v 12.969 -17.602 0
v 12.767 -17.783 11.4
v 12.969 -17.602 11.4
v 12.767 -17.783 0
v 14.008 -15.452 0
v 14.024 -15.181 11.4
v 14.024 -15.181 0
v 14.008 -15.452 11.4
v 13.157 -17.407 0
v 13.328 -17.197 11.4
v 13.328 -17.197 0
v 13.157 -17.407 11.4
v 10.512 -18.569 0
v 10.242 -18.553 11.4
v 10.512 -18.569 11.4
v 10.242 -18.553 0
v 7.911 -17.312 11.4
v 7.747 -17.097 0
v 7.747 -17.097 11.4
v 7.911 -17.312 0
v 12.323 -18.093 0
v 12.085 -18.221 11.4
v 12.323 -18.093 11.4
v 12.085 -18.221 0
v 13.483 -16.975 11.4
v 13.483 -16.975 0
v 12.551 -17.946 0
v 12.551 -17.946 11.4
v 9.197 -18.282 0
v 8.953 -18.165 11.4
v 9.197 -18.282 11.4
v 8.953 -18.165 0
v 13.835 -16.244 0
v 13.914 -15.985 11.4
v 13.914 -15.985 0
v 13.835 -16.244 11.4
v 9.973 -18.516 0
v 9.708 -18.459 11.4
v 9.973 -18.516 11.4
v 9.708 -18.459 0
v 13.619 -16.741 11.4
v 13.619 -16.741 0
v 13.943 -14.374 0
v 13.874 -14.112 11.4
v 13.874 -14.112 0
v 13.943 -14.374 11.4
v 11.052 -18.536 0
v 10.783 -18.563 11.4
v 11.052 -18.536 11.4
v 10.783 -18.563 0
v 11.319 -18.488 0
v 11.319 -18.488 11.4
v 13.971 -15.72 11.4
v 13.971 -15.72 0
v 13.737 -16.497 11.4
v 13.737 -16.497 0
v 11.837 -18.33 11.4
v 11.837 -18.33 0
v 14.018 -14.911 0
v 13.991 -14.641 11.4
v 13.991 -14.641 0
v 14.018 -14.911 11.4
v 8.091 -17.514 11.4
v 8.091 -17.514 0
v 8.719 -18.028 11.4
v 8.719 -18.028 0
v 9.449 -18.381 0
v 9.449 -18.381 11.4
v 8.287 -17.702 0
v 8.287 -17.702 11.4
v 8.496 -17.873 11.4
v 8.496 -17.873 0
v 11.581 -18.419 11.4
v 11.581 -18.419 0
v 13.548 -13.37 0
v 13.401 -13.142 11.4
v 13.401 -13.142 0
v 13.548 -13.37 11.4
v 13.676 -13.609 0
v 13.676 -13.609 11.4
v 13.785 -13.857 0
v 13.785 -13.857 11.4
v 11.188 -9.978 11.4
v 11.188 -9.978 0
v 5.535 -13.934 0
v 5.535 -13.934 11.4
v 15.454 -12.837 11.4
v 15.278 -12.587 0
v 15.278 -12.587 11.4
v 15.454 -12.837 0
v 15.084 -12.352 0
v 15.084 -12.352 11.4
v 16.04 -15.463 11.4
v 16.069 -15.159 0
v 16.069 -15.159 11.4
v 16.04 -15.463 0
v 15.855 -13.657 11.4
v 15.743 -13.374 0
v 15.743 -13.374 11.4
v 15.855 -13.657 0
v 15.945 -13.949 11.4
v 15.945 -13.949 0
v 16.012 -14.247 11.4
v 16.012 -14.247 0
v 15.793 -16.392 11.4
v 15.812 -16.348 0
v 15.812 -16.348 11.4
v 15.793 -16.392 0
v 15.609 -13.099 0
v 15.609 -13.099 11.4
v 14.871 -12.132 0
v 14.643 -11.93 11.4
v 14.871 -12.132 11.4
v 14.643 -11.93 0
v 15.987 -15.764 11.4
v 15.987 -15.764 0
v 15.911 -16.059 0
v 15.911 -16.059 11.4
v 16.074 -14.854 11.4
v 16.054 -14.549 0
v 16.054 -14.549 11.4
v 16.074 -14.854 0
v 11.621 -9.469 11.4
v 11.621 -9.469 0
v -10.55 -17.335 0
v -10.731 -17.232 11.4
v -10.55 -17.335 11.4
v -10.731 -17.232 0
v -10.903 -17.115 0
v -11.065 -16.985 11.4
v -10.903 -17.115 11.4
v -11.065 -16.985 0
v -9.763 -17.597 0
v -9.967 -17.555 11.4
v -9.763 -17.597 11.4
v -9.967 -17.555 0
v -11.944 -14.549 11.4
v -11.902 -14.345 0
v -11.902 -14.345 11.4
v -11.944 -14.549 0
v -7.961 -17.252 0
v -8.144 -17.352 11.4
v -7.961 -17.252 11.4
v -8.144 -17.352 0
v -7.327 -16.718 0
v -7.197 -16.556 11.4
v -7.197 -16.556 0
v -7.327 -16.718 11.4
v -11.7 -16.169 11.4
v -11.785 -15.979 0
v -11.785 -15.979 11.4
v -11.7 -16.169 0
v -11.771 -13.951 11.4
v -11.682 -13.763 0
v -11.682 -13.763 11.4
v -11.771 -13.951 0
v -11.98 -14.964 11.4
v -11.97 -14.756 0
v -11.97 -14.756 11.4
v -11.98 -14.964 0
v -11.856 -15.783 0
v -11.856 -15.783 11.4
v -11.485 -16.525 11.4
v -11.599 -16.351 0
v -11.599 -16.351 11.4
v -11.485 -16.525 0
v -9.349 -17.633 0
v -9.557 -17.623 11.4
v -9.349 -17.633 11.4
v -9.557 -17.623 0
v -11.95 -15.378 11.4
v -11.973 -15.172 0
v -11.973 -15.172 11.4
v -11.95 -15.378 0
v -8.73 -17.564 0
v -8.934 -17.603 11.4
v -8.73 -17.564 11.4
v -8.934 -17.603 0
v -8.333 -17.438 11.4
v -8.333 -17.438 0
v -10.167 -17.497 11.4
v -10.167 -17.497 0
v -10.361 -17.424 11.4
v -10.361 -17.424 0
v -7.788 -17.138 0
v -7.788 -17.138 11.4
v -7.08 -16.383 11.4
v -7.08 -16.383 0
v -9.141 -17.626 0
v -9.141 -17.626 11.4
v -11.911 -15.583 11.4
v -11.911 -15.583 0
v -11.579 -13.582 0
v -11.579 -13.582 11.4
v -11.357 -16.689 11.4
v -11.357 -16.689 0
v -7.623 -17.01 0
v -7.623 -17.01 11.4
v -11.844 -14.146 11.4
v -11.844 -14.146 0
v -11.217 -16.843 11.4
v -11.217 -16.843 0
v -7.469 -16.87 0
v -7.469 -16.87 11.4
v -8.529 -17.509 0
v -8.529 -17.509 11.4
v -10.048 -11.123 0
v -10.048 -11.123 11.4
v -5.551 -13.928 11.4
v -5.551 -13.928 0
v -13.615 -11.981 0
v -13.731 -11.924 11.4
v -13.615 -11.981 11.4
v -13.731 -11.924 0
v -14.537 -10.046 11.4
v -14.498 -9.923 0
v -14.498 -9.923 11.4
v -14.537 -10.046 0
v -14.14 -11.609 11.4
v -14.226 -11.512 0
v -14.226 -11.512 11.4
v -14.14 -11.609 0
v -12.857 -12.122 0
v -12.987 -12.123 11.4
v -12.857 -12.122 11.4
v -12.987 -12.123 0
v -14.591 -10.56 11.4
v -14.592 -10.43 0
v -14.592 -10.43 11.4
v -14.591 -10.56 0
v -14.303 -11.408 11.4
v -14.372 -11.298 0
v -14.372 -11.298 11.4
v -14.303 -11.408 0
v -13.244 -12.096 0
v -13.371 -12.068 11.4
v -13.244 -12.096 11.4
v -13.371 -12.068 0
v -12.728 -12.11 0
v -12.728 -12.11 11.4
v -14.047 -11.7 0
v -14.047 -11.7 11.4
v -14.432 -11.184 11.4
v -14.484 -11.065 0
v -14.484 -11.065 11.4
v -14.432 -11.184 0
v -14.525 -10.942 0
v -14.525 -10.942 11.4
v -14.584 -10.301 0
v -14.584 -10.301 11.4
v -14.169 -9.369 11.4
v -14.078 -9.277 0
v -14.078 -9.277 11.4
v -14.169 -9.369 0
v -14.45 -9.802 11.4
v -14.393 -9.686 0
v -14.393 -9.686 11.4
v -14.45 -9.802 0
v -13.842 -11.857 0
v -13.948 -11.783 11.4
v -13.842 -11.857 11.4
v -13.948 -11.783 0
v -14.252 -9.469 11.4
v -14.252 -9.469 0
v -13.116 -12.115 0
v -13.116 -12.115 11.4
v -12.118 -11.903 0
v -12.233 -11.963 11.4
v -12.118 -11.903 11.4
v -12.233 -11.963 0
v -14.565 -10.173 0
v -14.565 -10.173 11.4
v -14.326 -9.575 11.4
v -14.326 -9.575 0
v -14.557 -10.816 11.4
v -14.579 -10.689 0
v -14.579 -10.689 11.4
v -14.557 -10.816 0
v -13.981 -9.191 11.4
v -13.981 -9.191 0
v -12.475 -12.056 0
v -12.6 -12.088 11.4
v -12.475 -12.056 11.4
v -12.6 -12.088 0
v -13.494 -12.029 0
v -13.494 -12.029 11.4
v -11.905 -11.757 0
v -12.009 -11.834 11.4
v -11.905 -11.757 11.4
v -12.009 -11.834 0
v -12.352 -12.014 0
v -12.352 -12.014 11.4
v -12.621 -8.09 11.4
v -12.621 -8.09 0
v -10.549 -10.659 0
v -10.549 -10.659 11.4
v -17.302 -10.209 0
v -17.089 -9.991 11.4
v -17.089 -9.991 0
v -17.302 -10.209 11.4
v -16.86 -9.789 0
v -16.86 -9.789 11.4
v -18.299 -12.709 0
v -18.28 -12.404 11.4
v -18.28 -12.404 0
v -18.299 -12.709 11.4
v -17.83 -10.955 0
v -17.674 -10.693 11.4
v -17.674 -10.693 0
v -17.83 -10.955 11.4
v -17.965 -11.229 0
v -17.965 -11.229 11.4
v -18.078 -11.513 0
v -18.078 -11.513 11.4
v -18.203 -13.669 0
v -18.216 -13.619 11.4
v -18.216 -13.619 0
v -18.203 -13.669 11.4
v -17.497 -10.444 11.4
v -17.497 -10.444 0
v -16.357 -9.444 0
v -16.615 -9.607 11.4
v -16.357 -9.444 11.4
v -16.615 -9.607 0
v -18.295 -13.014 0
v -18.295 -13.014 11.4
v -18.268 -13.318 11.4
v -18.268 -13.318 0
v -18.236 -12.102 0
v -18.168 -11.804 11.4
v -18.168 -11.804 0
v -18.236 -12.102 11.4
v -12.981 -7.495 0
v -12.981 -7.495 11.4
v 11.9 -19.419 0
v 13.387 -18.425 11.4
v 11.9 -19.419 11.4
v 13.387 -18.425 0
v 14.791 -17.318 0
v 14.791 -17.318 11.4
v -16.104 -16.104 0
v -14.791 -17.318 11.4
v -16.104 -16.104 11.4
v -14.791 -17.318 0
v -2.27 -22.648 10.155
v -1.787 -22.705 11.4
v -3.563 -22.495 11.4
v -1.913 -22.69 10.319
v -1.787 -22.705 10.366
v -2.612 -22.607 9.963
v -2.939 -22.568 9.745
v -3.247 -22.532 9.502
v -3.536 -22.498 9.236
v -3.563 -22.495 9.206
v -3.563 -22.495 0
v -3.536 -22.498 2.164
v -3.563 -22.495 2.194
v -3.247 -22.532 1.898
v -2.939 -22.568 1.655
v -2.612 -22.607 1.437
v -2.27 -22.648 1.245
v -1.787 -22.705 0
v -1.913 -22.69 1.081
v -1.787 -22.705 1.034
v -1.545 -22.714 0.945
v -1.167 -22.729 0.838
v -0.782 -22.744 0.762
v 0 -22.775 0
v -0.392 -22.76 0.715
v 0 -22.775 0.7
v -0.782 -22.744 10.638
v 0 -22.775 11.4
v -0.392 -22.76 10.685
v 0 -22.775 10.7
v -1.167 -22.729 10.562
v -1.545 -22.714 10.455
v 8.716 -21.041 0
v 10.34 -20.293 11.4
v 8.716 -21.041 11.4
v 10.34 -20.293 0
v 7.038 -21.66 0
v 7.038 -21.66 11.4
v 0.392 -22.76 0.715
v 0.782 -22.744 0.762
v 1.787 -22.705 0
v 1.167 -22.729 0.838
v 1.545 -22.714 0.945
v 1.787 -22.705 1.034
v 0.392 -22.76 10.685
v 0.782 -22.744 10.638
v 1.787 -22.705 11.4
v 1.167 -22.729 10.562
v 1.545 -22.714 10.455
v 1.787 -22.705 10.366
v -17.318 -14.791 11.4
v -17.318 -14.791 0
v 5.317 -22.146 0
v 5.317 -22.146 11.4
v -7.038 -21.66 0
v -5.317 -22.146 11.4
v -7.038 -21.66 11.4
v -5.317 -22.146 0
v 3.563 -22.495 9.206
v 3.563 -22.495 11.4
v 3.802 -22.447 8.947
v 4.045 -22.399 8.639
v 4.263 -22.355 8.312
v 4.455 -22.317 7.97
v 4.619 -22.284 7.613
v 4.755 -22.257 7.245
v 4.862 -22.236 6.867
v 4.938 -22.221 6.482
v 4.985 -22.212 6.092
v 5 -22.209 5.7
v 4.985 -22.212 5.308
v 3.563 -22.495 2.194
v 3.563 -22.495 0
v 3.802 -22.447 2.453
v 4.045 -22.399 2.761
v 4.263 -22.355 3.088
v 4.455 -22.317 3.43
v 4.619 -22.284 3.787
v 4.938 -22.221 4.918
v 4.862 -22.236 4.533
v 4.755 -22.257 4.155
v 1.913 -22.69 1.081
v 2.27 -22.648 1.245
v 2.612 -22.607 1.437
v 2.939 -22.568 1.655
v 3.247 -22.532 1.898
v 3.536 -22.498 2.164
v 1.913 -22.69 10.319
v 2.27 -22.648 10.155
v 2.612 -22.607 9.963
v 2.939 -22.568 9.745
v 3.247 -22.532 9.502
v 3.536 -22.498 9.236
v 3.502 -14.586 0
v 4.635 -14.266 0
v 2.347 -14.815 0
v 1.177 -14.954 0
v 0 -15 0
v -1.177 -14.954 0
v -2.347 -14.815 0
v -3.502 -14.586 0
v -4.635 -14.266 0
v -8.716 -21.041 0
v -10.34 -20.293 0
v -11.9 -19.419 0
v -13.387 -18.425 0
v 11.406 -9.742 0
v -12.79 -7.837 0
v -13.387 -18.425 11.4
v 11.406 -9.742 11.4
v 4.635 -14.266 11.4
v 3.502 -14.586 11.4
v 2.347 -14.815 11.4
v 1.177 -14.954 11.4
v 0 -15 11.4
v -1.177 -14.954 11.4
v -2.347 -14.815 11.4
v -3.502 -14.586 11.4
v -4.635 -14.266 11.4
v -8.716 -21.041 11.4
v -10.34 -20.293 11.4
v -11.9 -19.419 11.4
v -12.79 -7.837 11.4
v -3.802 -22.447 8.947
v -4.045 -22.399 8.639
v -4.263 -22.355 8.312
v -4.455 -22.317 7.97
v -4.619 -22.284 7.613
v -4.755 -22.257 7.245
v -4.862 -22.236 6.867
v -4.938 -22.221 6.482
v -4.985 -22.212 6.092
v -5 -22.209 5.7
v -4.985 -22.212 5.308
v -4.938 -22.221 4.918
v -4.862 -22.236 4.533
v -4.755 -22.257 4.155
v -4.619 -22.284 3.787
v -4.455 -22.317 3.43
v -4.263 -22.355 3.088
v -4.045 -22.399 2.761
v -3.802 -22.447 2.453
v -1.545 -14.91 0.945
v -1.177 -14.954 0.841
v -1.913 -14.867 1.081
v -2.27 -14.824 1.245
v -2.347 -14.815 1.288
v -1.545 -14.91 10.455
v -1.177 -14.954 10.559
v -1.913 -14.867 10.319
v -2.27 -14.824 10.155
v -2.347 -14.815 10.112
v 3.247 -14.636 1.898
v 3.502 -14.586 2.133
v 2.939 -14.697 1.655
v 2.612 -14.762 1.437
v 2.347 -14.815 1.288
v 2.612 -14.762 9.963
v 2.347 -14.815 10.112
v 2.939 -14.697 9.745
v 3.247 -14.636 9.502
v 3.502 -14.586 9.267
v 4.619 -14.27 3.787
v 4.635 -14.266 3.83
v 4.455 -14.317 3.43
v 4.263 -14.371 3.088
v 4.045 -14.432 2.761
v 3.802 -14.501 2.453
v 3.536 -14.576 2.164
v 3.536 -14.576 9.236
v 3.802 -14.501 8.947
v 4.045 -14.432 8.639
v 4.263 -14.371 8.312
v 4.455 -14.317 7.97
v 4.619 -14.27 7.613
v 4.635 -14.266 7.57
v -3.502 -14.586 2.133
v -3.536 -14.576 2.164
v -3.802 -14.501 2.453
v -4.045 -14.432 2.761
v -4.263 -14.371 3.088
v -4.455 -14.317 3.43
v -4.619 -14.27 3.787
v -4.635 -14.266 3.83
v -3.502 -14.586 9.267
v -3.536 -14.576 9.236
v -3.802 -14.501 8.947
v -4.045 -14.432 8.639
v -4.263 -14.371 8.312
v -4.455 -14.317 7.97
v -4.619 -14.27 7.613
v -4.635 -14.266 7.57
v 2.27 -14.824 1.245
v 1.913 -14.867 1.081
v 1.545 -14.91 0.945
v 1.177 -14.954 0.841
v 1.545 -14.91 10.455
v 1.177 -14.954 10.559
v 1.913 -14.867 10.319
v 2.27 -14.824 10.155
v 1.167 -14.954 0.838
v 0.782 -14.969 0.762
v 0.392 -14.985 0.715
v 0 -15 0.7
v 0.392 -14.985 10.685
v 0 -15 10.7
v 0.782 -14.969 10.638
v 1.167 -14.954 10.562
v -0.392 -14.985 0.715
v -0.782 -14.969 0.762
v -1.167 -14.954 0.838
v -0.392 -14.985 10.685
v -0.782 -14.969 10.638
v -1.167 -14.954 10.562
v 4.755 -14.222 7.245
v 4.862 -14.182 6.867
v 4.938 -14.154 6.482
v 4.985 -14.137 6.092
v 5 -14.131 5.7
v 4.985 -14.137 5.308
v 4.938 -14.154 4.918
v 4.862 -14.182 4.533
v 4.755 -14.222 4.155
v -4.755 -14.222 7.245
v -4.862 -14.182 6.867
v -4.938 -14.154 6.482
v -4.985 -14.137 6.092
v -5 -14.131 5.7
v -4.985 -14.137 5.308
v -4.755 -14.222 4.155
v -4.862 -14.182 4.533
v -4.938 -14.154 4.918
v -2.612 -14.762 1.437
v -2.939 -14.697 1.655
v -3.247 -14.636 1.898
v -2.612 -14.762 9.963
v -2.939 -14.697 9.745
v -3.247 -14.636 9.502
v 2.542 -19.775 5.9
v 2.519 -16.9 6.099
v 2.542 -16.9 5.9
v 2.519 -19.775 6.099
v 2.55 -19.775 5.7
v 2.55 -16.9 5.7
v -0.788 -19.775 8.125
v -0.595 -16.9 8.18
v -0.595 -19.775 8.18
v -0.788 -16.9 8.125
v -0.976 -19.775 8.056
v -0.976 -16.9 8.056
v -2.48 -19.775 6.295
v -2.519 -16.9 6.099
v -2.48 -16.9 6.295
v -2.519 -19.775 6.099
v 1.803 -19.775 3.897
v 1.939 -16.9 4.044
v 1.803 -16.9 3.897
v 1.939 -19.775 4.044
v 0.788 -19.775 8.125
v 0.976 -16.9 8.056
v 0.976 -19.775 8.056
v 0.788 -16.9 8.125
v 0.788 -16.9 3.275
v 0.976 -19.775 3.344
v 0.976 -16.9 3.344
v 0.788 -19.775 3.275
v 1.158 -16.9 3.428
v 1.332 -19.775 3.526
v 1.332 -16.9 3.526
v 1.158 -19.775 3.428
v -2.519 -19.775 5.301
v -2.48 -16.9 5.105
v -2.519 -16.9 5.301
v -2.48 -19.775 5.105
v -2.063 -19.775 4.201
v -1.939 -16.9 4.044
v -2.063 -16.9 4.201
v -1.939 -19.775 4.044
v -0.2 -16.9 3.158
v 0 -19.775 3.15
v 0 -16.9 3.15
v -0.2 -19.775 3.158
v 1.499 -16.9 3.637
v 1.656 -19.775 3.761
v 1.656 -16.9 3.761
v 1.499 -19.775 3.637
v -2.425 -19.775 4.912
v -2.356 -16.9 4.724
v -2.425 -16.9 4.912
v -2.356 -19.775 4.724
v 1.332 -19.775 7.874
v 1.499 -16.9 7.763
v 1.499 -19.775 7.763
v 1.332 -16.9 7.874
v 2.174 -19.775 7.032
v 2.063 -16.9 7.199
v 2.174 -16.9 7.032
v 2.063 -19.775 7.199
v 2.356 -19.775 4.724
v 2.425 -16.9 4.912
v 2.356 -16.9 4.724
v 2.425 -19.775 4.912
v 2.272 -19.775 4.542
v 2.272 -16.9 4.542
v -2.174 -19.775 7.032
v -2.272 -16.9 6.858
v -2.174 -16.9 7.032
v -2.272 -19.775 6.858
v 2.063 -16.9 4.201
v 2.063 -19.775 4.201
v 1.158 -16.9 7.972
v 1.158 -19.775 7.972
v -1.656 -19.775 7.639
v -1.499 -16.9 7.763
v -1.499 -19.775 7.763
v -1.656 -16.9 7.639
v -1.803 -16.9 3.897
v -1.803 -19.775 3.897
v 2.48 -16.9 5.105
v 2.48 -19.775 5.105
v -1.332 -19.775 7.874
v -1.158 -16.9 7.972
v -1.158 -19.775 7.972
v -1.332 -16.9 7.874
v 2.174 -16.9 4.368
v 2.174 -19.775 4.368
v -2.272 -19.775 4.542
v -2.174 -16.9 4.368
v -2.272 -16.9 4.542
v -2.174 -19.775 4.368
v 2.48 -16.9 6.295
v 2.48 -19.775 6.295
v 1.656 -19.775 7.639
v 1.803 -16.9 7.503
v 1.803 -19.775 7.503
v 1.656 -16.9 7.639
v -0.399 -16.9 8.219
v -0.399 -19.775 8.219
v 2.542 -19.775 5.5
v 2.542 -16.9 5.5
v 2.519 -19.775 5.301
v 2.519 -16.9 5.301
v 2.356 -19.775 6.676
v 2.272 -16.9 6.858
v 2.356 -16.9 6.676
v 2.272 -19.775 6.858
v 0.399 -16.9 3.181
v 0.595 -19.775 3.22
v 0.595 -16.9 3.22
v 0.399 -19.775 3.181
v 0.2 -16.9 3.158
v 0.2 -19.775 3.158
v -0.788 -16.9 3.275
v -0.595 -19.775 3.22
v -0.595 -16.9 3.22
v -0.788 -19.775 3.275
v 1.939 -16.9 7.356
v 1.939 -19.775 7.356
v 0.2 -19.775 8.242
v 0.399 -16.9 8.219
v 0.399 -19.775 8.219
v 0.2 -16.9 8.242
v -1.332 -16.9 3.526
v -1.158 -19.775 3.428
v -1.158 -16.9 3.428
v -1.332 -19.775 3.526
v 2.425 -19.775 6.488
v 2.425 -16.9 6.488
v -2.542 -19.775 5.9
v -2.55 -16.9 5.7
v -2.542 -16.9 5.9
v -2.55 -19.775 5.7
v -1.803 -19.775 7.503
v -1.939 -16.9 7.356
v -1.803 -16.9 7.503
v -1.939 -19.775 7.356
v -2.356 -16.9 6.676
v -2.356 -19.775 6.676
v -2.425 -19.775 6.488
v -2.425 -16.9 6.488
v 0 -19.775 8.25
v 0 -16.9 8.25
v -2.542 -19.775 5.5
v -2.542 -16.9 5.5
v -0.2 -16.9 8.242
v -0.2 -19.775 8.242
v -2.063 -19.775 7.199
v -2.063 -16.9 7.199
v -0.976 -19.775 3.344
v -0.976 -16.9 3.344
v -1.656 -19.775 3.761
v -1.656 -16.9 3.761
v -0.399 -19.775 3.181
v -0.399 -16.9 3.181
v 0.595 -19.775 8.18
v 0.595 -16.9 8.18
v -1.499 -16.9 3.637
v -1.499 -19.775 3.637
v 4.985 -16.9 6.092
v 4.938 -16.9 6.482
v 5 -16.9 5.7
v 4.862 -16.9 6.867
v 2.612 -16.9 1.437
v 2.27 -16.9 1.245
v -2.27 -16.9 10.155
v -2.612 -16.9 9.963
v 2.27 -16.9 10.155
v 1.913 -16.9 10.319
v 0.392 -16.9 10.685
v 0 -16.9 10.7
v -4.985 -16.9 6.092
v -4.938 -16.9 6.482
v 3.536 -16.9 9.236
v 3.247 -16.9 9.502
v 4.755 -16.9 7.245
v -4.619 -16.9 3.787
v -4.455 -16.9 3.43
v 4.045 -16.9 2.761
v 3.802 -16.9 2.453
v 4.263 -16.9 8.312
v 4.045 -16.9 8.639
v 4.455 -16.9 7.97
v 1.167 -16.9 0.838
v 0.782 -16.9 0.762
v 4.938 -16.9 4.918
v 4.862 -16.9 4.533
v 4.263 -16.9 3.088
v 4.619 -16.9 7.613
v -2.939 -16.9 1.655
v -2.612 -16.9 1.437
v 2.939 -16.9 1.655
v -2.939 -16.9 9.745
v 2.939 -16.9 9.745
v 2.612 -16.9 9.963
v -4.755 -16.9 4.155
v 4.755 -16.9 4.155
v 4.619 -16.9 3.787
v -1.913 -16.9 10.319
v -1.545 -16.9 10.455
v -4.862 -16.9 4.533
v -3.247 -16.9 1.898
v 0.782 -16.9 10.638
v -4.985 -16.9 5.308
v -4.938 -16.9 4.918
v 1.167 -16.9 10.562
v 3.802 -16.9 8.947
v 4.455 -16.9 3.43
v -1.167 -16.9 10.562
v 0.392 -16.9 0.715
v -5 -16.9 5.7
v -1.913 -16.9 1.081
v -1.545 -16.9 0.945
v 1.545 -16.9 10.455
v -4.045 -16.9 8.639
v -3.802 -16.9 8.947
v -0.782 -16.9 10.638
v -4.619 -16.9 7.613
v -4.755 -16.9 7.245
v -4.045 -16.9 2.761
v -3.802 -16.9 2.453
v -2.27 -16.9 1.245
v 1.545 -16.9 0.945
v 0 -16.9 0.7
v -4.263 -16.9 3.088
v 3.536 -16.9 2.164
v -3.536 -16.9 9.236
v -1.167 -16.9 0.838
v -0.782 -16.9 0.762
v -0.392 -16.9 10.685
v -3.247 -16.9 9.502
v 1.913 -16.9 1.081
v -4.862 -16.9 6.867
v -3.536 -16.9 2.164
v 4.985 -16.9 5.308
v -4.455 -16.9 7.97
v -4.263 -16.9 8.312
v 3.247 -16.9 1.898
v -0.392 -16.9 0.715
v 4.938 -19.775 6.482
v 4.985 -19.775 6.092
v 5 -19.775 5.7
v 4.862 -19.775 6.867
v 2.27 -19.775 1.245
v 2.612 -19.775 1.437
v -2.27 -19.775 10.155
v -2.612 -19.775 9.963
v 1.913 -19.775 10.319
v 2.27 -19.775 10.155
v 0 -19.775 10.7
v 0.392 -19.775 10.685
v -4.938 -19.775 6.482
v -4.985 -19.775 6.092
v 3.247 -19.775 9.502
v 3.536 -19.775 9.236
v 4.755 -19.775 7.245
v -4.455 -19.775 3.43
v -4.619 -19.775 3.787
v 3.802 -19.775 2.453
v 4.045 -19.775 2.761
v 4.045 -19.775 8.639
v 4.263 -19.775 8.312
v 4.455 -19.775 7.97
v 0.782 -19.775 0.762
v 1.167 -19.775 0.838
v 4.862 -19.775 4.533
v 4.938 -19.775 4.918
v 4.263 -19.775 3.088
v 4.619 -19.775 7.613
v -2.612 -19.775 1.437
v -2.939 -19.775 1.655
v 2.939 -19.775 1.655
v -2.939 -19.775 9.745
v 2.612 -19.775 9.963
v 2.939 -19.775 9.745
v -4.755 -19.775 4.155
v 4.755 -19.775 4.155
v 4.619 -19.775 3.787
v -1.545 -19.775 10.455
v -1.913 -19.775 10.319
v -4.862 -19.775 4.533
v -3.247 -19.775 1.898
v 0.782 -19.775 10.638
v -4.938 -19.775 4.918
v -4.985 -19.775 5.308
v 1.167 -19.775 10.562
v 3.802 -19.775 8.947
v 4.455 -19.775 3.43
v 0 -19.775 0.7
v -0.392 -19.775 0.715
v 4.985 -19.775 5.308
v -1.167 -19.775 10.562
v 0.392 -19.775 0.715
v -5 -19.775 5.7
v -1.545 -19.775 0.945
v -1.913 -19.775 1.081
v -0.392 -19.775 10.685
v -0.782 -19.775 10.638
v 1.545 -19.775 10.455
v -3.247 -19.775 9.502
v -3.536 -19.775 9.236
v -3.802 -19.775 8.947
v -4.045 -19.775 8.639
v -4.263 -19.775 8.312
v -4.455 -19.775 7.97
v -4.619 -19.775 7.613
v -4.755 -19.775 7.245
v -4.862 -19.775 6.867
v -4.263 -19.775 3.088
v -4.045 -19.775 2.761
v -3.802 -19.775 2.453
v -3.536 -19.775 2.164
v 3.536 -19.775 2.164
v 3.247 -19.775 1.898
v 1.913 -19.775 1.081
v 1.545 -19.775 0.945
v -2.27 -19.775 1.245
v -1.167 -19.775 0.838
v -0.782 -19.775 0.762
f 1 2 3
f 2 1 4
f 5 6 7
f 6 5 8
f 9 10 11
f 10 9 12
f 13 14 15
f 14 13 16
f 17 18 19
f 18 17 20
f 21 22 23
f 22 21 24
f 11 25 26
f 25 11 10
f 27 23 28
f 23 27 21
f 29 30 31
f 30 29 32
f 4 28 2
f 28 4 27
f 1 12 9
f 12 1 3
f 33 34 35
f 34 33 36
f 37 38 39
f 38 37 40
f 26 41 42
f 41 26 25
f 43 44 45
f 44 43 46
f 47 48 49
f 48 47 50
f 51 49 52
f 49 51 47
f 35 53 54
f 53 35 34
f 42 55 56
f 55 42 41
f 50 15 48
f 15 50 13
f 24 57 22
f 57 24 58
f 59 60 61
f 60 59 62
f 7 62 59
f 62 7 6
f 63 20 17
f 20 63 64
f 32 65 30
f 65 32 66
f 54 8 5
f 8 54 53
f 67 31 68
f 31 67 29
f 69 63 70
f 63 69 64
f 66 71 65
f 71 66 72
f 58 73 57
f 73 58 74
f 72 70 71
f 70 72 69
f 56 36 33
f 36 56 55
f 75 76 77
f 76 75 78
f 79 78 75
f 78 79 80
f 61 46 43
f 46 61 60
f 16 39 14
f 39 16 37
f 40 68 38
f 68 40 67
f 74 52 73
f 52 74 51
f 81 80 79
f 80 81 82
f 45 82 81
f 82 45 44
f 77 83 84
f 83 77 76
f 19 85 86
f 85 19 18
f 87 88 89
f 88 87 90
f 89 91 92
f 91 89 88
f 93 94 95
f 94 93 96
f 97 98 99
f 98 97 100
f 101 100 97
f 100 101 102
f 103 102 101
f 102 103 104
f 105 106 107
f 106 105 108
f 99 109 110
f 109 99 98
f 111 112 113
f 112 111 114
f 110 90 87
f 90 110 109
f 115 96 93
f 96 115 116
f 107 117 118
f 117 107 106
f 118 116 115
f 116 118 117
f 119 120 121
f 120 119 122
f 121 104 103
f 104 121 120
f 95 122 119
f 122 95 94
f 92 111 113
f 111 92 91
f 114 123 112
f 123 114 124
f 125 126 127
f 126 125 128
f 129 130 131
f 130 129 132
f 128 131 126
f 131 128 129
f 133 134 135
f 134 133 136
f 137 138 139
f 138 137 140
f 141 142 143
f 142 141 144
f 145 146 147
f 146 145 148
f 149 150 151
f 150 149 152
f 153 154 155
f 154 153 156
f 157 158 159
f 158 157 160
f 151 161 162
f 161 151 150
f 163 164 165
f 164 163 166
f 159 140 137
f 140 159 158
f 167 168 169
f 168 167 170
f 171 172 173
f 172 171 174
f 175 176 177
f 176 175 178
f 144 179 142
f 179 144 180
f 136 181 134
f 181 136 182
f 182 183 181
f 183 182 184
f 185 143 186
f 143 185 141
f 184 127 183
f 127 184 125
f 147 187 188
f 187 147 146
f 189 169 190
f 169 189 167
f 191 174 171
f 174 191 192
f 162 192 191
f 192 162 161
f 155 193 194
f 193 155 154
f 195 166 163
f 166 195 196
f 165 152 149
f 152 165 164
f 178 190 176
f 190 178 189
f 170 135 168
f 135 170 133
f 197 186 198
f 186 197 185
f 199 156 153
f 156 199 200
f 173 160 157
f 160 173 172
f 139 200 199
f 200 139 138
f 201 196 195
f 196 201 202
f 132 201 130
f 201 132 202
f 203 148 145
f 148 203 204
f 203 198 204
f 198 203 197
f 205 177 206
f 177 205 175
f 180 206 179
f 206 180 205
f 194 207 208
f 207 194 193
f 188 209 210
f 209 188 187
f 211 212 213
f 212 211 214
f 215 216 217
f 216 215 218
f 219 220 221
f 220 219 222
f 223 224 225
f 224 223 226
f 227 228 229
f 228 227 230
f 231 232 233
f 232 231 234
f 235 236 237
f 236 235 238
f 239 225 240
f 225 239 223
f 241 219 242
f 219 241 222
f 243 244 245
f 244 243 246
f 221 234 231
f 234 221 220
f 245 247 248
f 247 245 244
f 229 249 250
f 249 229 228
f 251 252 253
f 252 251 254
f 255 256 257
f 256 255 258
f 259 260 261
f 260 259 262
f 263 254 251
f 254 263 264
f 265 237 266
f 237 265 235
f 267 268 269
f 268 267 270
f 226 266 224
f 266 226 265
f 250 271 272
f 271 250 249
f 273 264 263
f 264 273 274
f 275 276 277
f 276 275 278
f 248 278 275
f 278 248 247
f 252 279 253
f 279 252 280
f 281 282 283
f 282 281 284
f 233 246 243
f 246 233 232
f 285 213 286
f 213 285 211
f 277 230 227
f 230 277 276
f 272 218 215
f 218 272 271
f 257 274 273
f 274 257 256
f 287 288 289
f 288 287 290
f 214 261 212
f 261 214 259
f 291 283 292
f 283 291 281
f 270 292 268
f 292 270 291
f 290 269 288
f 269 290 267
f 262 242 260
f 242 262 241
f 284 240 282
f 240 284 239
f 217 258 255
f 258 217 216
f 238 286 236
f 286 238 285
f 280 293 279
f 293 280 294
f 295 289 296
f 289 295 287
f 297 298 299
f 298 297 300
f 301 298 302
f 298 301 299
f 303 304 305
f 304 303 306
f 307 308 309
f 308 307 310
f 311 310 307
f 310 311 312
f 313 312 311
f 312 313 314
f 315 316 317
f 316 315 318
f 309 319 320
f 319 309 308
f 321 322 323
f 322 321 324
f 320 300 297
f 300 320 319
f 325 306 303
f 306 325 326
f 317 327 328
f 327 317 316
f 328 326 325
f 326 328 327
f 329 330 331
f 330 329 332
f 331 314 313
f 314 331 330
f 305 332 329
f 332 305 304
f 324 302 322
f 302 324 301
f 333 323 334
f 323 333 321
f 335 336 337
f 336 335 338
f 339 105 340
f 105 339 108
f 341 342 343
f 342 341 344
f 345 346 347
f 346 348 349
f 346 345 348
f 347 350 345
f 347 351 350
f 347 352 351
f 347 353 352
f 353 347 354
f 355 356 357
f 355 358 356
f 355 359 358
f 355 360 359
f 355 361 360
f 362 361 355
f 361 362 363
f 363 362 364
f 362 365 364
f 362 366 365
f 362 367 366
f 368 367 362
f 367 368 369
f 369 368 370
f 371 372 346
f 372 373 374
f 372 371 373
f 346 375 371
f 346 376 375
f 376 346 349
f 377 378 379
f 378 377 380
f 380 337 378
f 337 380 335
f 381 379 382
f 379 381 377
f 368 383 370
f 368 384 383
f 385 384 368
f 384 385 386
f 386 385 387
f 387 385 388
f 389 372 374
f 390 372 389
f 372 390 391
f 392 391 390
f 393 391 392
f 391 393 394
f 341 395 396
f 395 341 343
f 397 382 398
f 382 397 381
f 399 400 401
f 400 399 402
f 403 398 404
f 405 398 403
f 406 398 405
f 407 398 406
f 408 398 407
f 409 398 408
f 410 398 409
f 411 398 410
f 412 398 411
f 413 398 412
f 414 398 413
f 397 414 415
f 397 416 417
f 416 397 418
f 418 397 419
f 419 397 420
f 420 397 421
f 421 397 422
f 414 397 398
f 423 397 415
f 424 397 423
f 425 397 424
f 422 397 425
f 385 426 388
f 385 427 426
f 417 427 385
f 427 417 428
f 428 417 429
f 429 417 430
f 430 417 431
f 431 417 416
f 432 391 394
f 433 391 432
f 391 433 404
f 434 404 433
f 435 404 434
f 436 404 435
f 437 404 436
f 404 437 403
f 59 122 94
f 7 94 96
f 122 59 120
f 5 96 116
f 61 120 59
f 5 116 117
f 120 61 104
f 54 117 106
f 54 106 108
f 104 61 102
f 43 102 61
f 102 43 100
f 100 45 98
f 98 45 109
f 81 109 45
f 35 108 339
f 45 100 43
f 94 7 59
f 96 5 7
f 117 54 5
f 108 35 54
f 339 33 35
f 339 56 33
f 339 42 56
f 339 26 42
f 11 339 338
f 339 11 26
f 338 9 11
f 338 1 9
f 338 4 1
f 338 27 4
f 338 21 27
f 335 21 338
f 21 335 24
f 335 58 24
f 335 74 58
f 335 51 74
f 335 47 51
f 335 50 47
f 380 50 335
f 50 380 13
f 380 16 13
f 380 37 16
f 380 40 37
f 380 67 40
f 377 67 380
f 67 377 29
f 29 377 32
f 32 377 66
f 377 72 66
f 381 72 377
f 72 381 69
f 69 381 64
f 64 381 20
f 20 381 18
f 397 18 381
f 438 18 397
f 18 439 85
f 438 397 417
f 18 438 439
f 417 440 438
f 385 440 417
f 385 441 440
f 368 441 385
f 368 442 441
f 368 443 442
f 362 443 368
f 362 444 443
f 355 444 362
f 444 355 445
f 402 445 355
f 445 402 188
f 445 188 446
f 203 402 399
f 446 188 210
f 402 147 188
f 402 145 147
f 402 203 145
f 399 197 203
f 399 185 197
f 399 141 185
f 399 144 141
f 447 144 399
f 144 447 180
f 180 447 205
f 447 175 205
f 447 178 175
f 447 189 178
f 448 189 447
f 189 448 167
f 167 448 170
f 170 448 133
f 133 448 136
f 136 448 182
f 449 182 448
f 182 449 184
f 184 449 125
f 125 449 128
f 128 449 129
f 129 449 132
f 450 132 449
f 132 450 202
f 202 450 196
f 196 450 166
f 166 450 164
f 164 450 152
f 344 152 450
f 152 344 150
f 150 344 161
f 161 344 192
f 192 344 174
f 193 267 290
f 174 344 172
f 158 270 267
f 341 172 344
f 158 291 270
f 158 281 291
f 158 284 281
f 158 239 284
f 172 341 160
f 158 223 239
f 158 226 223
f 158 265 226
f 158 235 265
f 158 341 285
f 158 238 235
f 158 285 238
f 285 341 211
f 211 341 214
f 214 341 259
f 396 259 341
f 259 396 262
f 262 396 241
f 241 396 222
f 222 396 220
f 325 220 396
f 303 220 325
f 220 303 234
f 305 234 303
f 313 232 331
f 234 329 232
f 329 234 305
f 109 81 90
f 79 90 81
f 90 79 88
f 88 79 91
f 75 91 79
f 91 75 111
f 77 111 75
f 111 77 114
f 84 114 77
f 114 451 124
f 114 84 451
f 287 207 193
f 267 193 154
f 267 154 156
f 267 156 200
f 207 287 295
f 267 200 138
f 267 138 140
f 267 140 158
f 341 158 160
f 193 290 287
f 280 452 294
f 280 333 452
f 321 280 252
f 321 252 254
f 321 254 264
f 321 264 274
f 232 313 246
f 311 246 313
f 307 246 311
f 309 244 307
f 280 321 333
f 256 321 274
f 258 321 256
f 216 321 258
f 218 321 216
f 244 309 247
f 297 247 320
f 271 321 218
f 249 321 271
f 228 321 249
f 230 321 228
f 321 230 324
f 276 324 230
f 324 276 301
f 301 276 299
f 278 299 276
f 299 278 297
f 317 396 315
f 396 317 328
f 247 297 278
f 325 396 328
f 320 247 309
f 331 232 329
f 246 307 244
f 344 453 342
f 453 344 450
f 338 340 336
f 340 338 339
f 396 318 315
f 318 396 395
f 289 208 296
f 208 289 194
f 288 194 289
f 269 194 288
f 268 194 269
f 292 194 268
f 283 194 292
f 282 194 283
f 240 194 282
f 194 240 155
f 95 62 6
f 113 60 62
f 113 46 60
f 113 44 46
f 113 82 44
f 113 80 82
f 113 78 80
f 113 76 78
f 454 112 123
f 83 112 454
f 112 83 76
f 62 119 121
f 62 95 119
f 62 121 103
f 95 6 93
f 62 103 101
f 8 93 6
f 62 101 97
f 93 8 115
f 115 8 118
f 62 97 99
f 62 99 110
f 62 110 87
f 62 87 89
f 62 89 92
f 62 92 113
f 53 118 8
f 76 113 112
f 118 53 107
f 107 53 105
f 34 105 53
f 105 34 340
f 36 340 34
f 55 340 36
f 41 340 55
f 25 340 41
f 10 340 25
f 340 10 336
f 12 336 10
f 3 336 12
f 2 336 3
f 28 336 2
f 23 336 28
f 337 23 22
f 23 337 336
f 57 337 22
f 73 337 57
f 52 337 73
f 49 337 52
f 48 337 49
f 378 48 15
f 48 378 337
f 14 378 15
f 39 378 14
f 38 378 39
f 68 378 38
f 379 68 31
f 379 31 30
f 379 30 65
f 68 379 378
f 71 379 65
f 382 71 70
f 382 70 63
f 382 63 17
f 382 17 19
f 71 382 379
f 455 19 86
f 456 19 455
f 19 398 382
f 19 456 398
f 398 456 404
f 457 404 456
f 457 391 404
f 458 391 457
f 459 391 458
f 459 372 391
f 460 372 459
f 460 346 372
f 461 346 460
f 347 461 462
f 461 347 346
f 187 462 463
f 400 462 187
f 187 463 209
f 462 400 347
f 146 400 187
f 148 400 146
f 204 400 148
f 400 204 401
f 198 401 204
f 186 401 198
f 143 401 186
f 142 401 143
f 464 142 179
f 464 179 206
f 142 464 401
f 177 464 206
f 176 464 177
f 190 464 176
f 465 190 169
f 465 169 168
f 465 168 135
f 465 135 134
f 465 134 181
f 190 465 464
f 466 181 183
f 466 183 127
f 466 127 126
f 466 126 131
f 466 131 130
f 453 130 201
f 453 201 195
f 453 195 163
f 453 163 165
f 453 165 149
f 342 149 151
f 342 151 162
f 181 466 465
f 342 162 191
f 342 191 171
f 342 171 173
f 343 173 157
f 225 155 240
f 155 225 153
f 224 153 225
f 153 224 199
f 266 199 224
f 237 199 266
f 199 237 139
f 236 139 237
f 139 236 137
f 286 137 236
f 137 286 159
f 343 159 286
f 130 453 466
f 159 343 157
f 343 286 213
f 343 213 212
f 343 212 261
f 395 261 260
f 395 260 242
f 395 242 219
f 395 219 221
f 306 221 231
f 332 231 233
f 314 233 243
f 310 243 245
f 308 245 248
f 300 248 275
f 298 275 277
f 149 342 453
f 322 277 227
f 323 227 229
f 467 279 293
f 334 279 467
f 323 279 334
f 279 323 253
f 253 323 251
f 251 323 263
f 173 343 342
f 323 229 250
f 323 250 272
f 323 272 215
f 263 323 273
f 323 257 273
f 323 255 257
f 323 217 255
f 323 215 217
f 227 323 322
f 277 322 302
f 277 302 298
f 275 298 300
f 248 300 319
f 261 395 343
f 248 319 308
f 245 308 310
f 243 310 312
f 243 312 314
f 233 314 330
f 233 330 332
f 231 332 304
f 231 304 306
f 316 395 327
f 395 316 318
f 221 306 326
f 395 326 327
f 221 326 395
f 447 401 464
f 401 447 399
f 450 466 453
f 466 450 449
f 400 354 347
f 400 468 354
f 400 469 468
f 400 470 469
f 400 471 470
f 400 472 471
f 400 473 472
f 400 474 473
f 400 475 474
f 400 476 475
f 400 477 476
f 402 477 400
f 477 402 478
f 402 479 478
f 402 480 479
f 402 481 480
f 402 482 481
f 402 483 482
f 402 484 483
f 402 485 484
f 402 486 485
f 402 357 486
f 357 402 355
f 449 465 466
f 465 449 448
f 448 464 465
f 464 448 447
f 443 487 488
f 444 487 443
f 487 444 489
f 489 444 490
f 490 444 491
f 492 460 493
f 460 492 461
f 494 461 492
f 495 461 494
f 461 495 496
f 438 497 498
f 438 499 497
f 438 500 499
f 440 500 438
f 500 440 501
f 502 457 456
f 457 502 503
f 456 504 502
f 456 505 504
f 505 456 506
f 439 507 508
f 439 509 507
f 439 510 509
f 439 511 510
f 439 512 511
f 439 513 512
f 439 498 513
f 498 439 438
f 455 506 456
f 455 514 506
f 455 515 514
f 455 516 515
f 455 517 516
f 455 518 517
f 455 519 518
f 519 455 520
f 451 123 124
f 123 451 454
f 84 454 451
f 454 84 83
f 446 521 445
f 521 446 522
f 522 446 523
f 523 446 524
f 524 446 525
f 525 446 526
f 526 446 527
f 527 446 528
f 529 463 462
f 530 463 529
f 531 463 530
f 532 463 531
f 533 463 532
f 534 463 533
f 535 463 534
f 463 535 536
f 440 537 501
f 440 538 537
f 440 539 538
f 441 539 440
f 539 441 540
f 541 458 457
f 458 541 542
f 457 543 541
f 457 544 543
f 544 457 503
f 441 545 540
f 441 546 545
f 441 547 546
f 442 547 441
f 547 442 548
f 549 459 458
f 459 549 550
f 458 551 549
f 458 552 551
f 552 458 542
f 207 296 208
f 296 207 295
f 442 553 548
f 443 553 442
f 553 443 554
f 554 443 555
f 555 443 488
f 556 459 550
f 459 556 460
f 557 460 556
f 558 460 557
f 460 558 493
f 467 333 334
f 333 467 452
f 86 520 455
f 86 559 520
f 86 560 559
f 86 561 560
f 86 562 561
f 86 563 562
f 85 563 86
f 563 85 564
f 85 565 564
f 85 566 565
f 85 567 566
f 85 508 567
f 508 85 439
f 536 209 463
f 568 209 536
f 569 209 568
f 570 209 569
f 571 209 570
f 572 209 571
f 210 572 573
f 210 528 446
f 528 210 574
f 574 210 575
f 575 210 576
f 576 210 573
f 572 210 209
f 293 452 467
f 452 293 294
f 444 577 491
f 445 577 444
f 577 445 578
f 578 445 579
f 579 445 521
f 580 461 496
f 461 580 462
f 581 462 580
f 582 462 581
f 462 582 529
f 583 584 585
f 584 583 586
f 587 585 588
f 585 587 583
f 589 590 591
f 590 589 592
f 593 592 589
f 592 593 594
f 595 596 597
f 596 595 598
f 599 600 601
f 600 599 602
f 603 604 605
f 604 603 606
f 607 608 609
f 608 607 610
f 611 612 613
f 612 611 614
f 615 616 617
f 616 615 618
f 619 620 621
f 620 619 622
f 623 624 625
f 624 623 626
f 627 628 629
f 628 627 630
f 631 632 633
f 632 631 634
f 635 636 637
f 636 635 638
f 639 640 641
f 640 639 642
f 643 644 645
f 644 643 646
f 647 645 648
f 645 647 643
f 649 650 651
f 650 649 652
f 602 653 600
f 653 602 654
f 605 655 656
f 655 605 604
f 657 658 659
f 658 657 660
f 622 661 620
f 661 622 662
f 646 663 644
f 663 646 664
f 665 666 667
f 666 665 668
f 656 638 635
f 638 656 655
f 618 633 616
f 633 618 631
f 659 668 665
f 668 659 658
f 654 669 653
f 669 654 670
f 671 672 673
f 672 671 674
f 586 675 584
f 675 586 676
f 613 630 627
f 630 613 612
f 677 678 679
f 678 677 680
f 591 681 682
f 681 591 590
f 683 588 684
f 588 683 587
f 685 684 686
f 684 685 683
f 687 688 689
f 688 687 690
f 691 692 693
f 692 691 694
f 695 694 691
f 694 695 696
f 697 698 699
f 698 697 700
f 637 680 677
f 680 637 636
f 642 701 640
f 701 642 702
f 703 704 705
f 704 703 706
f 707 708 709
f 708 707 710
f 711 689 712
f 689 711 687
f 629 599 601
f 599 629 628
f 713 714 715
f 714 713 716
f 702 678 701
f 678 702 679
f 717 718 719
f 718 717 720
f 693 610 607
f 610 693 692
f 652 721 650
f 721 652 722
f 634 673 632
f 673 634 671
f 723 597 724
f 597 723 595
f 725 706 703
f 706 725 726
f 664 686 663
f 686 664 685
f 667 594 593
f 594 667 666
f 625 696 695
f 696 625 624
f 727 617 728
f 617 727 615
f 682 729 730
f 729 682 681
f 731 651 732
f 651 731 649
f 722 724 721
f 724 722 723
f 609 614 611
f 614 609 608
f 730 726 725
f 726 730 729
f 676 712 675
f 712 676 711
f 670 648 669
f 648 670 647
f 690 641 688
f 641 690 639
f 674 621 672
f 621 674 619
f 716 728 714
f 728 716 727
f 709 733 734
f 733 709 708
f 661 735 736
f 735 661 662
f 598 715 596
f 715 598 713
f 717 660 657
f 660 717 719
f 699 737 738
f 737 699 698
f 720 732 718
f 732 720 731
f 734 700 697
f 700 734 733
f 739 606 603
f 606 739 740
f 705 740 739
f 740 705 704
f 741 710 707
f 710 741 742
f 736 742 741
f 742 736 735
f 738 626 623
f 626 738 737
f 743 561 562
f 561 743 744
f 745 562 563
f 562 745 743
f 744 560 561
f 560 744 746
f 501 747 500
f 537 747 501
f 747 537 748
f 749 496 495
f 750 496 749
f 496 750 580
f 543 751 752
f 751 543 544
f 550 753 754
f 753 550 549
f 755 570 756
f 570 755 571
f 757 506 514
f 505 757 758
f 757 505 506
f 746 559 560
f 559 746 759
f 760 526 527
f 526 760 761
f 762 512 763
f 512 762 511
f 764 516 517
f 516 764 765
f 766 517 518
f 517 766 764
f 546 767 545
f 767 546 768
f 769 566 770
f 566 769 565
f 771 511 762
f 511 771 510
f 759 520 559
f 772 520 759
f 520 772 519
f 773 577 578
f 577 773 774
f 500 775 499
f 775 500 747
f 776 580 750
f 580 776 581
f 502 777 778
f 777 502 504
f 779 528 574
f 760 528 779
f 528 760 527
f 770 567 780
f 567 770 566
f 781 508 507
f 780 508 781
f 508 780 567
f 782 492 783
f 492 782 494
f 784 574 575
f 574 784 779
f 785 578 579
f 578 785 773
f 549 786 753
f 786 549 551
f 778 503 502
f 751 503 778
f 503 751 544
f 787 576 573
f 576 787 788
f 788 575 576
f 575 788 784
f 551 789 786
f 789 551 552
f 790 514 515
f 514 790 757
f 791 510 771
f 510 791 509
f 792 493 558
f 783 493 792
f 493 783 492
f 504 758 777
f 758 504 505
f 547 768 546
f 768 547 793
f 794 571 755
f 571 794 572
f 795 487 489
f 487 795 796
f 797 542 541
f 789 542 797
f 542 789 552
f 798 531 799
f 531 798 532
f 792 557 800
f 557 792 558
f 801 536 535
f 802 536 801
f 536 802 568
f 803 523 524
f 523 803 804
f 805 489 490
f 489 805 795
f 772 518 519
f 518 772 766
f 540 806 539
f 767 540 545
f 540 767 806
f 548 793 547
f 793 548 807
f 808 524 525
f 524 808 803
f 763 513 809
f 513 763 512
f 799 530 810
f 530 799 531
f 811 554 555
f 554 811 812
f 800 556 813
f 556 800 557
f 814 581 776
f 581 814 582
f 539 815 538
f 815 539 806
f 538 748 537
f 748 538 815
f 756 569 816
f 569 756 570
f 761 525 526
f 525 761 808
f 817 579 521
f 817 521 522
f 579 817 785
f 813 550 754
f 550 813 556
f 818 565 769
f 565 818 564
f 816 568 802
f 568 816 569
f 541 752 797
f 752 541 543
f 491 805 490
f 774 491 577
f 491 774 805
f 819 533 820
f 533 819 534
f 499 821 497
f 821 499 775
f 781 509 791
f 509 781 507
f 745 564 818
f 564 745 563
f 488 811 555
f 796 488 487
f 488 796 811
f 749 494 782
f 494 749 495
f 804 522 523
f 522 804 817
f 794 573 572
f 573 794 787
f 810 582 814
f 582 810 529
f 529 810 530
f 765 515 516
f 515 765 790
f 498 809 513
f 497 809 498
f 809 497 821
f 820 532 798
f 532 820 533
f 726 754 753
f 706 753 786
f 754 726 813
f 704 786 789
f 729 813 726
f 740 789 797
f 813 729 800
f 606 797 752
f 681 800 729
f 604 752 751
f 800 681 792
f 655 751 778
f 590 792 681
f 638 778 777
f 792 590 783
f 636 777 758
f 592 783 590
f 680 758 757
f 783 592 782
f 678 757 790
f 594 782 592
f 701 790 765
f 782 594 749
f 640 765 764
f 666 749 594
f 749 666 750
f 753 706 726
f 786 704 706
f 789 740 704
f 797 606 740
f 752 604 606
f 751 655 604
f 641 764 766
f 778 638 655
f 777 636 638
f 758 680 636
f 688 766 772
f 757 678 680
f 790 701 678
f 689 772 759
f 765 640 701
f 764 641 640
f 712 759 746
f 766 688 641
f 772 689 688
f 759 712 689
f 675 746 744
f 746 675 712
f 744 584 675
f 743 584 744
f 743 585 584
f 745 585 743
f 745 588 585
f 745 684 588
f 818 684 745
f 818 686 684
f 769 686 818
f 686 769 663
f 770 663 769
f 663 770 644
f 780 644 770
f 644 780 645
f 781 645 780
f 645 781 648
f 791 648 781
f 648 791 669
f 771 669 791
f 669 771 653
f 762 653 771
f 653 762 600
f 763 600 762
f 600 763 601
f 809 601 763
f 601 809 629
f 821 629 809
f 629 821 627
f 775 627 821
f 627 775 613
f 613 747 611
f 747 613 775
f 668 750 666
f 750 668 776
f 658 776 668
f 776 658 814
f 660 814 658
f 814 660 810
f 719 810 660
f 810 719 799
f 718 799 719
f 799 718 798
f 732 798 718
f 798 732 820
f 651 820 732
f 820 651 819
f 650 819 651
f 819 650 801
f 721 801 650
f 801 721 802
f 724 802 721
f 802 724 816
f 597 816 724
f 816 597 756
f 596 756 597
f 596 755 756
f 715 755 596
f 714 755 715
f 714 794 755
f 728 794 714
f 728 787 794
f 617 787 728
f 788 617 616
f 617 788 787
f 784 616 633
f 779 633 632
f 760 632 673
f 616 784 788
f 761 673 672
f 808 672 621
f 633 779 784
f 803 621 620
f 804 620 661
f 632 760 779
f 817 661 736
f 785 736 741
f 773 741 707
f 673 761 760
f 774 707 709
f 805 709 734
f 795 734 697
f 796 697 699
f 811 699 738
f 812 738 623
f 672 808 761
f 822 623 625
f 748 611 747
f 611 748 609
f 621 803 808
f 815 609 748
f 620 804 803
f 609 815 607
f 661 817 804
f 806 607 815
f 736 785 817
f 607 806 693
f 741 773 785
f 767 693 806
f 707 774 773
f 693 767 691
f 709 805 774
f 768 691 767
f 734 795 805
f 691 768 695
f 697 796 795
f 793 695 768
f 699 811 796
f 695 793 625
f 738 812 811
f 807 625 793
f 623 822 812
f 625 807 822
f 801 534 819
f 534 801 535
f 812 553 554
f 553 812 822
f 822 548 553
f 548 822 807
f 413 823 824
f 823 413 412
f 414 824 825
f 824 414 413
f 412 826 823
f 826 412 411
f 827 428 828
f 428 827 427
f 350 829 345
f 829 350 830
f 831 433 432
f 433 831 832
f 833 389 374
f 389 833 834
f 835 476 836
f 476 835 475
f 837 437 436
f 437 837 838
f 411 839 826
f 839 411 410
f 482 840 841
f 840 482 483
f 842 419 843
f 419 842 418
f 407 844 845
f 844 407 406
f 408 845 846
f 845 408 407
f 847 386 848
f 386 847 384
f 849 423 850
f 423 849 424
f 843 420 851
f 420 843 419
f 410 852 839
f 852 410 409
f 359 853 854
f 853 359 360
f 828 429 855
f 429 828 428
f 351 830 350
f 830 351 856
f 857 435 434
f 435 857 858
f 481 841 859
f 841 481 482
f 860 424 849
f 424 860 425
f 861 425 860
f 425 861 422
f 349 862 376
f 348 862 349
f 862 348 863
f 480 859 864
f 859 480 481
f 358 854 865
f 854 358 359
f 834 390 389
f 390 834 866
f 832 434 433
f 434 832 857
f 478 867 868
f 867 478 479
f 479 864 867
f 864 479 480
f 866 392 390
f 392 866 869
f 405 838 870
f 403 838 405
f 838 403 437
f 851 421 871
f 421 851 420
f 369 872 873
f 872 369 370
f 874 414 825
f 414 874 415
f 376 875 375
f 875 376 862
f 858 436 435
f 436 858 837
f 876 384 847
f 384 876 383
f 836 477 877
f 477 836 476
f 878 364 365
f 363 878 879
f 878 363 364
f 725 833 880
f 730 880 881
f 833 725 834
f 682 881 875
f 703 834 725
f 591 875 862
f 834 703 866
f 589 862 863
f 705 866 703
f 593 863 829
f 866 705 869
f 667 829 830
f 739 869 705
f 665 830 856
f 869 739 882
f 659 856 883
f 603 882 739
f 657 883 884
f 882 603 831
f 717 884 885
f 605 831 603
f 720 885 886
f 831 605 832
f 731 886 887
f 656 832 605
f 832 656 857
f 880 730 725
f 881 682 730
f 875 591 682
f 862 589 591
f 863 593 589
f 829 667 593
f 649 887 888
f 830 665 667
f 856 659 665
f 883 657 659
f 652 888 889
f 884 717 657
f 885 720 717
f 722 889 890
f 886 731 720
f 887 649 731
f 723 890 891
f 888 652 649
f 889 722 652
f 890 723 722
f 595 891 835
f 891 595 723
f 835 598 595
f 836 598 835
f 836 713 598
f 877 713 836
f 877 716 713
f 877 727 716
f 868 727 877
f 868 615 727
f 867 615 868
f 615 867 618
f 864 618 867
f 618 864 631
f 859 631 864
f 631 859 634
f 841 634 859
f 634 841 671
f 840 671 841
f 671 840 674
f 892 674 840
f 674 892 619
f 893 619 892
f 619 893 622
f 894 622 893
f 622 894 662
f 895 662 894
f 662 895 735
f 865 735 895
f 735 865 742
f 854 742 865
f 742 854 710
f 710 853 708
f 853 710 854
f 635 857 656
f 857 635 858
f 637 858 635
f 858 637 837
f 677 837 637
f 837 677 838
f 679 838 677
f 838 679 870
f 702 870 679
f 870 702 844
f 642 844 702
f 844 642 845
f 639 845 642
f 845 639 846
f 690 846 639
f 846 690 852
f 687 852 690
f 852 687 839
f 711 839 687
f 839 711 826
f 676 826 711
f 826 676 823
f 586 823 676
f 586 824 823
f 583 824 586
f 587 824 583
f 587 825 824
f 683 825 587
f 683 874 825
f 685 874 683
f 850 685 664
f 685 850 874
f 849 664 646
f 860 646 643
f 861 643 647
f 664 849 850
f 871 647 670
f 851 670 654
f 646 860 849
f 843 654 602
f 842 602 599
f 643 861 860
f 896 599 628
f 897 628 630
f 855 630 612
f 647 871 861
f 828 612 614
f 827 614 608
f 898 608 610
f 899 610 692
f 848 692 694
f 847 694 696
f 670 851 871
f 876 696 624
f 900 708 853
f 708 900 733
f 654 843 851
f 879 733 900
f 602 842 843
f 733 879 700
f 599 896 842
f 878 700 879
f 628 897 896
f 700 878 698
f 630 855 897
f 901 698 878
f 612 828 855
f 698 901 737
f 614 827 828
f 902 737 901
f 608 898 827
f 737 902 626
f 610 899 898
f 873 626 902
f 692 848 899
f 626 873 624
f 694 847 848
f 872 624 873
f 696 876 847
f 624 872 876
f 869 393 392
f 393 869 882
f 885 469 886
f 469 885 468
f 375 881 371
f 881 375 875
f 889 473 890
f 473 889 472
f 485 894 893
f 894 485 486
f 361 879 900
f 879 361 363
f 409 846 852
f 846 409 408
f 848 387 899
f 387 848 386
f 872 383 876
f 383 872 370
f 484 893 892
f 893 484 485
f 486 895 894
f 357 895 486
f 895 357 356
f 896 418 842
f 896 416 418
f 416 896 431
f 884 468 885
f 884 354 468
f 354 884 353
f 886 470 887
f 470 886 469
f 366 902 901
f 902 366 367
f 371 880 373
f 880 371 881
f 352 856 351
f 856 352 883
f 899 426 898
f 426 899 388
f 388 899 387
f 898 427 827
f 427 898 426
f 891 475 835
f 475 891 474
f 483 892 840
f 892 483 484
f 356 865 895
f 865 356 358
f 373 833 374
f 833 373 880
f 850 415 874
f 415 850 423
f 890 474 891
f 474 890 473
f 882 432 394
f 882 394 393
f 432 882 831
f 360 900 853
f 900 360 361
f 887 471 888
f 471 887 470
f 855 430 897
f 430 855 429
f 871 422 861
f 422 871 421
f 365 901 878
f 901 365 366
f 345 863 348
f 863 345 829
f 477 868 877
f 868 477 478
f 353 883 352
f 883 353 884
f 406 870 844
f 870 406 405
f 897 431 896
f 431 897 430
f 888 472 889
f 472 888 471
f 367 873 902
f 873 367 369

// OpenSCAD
/*
 Bowdenzug-/Kabelhalter inspired by
 'Cable Guide' by 'rufuswenlock' (https://www.thingiverse.com/thing:931817)

    by Marc Hoppe, 2018

    This program is free software: you can redistribute it and/or modify
    it under the terms of the GNU General Public License as published by
    the Free Software Foundation, either version 3 of the License, or
    (at your option) any later version.

    This program is distributed in the hope that it will be useful,
    but WITHOUT ANY WARRANTY; without even the implied warranty of
    MERCHANTABILITY or FITNESS FOR A PARTICULAR PURPOSE.  See the
    GNU General Public License for more details.

    You should have received a copy of the GNU General Public License
    along with this program.  If not, see <https://www.gnu.org/licenses/>.
*/

$fn=80;

dr=30;
delta=0.7;

dr1=6.9;
dr2=0;
dl1=5.3;
dl2=3.3;

dbohr=5.1;

dsockel=10;
hsockel=1.9;

dsenk=10;
hsenk=3;


// -----------------------------------------------

h=max(dsockel, dsenk)+delta*2;
da=dr+max(dr1, dr2, dl1, dl2)*2+delta*2.5;

main();

// -----------------------------------------------

module main()
{
	difference() {
		cylinder(r=da/2,h=h, center=1);

		// Rohr weg
		translate([0,0,-1]) cylinder(r=dr/2,h=h+2, center=1);
		// untere Hälfte weg
		translate([-(da/2+5), 0, -1]) cube([da+10, da+5, h+2]);
		// Bohrung
		translate([0,-dr/2+2,h/2]) rotate([90,0,0]) cylinder(r=dbohr/2, da-dr+2, center=1);
		// Aussparung für Anlötsockel
		translate([0,-dr/2+10,h/2]) rotate([90,0,0]) cylinder(r=dsockel/2, hsockel+10, center=1);
		// Senkung für Schraube
		translate([0,-da/2+hsenk,h/2]) rotate([90,0,0]) cylinder(r=dsenk/2, hsenk+10, center=1);
		// Aussparungen für Kabel
		cables(dr1, dr2);
		mirror([1,0,0]) cables(dl1, dl2);

		}
}

// ---------------------------------------------------

module cables(d1,d2) {

	rges=dsockel/2+delta;

	w1deg=(rges+d1/2)/(dr/2)*180/3.14;
	cable(w=w1deg, d=d1);
	r1ges= d1!=0 ? rges+d1+delta : rges;

	w2deg=(r1ges+d2/2)/(dr/2)*180/3.14;
	cable(w=w2deg, d=d2);
	r2ges= d2!=0 ? r1ges+d2+delta : r1ges;

	w3deg=(r2ges)/(dr/2)*180/3.14;
	rotate([0,0,-90+w3deg]) {
		translate([dr/2-5,0,-1]) cube([(da-dr)/2+10,30,h+2]);
		r3=(da-dr)/4;
		translate([dr/2+r3,-r3,-1]) difference() {
			cube([r3*3,r3*3,h+2]);
			translate([0,0,-1])  cylinder(r=r3, h=h+4, center=1);
		}
	}
}

// -----------------------------------------------

module cable(w, d)
{
	rotate([0,0,-90+w]) {
		translate([dr/2+d/2,0,-1]) cylinder(r=d/2, h+2, center=1);
		translate([dr/2-(da-dr)/2+d/2,-d/2,-1]) cube([(da-dr)/2,d,h+2]);
	}
}
